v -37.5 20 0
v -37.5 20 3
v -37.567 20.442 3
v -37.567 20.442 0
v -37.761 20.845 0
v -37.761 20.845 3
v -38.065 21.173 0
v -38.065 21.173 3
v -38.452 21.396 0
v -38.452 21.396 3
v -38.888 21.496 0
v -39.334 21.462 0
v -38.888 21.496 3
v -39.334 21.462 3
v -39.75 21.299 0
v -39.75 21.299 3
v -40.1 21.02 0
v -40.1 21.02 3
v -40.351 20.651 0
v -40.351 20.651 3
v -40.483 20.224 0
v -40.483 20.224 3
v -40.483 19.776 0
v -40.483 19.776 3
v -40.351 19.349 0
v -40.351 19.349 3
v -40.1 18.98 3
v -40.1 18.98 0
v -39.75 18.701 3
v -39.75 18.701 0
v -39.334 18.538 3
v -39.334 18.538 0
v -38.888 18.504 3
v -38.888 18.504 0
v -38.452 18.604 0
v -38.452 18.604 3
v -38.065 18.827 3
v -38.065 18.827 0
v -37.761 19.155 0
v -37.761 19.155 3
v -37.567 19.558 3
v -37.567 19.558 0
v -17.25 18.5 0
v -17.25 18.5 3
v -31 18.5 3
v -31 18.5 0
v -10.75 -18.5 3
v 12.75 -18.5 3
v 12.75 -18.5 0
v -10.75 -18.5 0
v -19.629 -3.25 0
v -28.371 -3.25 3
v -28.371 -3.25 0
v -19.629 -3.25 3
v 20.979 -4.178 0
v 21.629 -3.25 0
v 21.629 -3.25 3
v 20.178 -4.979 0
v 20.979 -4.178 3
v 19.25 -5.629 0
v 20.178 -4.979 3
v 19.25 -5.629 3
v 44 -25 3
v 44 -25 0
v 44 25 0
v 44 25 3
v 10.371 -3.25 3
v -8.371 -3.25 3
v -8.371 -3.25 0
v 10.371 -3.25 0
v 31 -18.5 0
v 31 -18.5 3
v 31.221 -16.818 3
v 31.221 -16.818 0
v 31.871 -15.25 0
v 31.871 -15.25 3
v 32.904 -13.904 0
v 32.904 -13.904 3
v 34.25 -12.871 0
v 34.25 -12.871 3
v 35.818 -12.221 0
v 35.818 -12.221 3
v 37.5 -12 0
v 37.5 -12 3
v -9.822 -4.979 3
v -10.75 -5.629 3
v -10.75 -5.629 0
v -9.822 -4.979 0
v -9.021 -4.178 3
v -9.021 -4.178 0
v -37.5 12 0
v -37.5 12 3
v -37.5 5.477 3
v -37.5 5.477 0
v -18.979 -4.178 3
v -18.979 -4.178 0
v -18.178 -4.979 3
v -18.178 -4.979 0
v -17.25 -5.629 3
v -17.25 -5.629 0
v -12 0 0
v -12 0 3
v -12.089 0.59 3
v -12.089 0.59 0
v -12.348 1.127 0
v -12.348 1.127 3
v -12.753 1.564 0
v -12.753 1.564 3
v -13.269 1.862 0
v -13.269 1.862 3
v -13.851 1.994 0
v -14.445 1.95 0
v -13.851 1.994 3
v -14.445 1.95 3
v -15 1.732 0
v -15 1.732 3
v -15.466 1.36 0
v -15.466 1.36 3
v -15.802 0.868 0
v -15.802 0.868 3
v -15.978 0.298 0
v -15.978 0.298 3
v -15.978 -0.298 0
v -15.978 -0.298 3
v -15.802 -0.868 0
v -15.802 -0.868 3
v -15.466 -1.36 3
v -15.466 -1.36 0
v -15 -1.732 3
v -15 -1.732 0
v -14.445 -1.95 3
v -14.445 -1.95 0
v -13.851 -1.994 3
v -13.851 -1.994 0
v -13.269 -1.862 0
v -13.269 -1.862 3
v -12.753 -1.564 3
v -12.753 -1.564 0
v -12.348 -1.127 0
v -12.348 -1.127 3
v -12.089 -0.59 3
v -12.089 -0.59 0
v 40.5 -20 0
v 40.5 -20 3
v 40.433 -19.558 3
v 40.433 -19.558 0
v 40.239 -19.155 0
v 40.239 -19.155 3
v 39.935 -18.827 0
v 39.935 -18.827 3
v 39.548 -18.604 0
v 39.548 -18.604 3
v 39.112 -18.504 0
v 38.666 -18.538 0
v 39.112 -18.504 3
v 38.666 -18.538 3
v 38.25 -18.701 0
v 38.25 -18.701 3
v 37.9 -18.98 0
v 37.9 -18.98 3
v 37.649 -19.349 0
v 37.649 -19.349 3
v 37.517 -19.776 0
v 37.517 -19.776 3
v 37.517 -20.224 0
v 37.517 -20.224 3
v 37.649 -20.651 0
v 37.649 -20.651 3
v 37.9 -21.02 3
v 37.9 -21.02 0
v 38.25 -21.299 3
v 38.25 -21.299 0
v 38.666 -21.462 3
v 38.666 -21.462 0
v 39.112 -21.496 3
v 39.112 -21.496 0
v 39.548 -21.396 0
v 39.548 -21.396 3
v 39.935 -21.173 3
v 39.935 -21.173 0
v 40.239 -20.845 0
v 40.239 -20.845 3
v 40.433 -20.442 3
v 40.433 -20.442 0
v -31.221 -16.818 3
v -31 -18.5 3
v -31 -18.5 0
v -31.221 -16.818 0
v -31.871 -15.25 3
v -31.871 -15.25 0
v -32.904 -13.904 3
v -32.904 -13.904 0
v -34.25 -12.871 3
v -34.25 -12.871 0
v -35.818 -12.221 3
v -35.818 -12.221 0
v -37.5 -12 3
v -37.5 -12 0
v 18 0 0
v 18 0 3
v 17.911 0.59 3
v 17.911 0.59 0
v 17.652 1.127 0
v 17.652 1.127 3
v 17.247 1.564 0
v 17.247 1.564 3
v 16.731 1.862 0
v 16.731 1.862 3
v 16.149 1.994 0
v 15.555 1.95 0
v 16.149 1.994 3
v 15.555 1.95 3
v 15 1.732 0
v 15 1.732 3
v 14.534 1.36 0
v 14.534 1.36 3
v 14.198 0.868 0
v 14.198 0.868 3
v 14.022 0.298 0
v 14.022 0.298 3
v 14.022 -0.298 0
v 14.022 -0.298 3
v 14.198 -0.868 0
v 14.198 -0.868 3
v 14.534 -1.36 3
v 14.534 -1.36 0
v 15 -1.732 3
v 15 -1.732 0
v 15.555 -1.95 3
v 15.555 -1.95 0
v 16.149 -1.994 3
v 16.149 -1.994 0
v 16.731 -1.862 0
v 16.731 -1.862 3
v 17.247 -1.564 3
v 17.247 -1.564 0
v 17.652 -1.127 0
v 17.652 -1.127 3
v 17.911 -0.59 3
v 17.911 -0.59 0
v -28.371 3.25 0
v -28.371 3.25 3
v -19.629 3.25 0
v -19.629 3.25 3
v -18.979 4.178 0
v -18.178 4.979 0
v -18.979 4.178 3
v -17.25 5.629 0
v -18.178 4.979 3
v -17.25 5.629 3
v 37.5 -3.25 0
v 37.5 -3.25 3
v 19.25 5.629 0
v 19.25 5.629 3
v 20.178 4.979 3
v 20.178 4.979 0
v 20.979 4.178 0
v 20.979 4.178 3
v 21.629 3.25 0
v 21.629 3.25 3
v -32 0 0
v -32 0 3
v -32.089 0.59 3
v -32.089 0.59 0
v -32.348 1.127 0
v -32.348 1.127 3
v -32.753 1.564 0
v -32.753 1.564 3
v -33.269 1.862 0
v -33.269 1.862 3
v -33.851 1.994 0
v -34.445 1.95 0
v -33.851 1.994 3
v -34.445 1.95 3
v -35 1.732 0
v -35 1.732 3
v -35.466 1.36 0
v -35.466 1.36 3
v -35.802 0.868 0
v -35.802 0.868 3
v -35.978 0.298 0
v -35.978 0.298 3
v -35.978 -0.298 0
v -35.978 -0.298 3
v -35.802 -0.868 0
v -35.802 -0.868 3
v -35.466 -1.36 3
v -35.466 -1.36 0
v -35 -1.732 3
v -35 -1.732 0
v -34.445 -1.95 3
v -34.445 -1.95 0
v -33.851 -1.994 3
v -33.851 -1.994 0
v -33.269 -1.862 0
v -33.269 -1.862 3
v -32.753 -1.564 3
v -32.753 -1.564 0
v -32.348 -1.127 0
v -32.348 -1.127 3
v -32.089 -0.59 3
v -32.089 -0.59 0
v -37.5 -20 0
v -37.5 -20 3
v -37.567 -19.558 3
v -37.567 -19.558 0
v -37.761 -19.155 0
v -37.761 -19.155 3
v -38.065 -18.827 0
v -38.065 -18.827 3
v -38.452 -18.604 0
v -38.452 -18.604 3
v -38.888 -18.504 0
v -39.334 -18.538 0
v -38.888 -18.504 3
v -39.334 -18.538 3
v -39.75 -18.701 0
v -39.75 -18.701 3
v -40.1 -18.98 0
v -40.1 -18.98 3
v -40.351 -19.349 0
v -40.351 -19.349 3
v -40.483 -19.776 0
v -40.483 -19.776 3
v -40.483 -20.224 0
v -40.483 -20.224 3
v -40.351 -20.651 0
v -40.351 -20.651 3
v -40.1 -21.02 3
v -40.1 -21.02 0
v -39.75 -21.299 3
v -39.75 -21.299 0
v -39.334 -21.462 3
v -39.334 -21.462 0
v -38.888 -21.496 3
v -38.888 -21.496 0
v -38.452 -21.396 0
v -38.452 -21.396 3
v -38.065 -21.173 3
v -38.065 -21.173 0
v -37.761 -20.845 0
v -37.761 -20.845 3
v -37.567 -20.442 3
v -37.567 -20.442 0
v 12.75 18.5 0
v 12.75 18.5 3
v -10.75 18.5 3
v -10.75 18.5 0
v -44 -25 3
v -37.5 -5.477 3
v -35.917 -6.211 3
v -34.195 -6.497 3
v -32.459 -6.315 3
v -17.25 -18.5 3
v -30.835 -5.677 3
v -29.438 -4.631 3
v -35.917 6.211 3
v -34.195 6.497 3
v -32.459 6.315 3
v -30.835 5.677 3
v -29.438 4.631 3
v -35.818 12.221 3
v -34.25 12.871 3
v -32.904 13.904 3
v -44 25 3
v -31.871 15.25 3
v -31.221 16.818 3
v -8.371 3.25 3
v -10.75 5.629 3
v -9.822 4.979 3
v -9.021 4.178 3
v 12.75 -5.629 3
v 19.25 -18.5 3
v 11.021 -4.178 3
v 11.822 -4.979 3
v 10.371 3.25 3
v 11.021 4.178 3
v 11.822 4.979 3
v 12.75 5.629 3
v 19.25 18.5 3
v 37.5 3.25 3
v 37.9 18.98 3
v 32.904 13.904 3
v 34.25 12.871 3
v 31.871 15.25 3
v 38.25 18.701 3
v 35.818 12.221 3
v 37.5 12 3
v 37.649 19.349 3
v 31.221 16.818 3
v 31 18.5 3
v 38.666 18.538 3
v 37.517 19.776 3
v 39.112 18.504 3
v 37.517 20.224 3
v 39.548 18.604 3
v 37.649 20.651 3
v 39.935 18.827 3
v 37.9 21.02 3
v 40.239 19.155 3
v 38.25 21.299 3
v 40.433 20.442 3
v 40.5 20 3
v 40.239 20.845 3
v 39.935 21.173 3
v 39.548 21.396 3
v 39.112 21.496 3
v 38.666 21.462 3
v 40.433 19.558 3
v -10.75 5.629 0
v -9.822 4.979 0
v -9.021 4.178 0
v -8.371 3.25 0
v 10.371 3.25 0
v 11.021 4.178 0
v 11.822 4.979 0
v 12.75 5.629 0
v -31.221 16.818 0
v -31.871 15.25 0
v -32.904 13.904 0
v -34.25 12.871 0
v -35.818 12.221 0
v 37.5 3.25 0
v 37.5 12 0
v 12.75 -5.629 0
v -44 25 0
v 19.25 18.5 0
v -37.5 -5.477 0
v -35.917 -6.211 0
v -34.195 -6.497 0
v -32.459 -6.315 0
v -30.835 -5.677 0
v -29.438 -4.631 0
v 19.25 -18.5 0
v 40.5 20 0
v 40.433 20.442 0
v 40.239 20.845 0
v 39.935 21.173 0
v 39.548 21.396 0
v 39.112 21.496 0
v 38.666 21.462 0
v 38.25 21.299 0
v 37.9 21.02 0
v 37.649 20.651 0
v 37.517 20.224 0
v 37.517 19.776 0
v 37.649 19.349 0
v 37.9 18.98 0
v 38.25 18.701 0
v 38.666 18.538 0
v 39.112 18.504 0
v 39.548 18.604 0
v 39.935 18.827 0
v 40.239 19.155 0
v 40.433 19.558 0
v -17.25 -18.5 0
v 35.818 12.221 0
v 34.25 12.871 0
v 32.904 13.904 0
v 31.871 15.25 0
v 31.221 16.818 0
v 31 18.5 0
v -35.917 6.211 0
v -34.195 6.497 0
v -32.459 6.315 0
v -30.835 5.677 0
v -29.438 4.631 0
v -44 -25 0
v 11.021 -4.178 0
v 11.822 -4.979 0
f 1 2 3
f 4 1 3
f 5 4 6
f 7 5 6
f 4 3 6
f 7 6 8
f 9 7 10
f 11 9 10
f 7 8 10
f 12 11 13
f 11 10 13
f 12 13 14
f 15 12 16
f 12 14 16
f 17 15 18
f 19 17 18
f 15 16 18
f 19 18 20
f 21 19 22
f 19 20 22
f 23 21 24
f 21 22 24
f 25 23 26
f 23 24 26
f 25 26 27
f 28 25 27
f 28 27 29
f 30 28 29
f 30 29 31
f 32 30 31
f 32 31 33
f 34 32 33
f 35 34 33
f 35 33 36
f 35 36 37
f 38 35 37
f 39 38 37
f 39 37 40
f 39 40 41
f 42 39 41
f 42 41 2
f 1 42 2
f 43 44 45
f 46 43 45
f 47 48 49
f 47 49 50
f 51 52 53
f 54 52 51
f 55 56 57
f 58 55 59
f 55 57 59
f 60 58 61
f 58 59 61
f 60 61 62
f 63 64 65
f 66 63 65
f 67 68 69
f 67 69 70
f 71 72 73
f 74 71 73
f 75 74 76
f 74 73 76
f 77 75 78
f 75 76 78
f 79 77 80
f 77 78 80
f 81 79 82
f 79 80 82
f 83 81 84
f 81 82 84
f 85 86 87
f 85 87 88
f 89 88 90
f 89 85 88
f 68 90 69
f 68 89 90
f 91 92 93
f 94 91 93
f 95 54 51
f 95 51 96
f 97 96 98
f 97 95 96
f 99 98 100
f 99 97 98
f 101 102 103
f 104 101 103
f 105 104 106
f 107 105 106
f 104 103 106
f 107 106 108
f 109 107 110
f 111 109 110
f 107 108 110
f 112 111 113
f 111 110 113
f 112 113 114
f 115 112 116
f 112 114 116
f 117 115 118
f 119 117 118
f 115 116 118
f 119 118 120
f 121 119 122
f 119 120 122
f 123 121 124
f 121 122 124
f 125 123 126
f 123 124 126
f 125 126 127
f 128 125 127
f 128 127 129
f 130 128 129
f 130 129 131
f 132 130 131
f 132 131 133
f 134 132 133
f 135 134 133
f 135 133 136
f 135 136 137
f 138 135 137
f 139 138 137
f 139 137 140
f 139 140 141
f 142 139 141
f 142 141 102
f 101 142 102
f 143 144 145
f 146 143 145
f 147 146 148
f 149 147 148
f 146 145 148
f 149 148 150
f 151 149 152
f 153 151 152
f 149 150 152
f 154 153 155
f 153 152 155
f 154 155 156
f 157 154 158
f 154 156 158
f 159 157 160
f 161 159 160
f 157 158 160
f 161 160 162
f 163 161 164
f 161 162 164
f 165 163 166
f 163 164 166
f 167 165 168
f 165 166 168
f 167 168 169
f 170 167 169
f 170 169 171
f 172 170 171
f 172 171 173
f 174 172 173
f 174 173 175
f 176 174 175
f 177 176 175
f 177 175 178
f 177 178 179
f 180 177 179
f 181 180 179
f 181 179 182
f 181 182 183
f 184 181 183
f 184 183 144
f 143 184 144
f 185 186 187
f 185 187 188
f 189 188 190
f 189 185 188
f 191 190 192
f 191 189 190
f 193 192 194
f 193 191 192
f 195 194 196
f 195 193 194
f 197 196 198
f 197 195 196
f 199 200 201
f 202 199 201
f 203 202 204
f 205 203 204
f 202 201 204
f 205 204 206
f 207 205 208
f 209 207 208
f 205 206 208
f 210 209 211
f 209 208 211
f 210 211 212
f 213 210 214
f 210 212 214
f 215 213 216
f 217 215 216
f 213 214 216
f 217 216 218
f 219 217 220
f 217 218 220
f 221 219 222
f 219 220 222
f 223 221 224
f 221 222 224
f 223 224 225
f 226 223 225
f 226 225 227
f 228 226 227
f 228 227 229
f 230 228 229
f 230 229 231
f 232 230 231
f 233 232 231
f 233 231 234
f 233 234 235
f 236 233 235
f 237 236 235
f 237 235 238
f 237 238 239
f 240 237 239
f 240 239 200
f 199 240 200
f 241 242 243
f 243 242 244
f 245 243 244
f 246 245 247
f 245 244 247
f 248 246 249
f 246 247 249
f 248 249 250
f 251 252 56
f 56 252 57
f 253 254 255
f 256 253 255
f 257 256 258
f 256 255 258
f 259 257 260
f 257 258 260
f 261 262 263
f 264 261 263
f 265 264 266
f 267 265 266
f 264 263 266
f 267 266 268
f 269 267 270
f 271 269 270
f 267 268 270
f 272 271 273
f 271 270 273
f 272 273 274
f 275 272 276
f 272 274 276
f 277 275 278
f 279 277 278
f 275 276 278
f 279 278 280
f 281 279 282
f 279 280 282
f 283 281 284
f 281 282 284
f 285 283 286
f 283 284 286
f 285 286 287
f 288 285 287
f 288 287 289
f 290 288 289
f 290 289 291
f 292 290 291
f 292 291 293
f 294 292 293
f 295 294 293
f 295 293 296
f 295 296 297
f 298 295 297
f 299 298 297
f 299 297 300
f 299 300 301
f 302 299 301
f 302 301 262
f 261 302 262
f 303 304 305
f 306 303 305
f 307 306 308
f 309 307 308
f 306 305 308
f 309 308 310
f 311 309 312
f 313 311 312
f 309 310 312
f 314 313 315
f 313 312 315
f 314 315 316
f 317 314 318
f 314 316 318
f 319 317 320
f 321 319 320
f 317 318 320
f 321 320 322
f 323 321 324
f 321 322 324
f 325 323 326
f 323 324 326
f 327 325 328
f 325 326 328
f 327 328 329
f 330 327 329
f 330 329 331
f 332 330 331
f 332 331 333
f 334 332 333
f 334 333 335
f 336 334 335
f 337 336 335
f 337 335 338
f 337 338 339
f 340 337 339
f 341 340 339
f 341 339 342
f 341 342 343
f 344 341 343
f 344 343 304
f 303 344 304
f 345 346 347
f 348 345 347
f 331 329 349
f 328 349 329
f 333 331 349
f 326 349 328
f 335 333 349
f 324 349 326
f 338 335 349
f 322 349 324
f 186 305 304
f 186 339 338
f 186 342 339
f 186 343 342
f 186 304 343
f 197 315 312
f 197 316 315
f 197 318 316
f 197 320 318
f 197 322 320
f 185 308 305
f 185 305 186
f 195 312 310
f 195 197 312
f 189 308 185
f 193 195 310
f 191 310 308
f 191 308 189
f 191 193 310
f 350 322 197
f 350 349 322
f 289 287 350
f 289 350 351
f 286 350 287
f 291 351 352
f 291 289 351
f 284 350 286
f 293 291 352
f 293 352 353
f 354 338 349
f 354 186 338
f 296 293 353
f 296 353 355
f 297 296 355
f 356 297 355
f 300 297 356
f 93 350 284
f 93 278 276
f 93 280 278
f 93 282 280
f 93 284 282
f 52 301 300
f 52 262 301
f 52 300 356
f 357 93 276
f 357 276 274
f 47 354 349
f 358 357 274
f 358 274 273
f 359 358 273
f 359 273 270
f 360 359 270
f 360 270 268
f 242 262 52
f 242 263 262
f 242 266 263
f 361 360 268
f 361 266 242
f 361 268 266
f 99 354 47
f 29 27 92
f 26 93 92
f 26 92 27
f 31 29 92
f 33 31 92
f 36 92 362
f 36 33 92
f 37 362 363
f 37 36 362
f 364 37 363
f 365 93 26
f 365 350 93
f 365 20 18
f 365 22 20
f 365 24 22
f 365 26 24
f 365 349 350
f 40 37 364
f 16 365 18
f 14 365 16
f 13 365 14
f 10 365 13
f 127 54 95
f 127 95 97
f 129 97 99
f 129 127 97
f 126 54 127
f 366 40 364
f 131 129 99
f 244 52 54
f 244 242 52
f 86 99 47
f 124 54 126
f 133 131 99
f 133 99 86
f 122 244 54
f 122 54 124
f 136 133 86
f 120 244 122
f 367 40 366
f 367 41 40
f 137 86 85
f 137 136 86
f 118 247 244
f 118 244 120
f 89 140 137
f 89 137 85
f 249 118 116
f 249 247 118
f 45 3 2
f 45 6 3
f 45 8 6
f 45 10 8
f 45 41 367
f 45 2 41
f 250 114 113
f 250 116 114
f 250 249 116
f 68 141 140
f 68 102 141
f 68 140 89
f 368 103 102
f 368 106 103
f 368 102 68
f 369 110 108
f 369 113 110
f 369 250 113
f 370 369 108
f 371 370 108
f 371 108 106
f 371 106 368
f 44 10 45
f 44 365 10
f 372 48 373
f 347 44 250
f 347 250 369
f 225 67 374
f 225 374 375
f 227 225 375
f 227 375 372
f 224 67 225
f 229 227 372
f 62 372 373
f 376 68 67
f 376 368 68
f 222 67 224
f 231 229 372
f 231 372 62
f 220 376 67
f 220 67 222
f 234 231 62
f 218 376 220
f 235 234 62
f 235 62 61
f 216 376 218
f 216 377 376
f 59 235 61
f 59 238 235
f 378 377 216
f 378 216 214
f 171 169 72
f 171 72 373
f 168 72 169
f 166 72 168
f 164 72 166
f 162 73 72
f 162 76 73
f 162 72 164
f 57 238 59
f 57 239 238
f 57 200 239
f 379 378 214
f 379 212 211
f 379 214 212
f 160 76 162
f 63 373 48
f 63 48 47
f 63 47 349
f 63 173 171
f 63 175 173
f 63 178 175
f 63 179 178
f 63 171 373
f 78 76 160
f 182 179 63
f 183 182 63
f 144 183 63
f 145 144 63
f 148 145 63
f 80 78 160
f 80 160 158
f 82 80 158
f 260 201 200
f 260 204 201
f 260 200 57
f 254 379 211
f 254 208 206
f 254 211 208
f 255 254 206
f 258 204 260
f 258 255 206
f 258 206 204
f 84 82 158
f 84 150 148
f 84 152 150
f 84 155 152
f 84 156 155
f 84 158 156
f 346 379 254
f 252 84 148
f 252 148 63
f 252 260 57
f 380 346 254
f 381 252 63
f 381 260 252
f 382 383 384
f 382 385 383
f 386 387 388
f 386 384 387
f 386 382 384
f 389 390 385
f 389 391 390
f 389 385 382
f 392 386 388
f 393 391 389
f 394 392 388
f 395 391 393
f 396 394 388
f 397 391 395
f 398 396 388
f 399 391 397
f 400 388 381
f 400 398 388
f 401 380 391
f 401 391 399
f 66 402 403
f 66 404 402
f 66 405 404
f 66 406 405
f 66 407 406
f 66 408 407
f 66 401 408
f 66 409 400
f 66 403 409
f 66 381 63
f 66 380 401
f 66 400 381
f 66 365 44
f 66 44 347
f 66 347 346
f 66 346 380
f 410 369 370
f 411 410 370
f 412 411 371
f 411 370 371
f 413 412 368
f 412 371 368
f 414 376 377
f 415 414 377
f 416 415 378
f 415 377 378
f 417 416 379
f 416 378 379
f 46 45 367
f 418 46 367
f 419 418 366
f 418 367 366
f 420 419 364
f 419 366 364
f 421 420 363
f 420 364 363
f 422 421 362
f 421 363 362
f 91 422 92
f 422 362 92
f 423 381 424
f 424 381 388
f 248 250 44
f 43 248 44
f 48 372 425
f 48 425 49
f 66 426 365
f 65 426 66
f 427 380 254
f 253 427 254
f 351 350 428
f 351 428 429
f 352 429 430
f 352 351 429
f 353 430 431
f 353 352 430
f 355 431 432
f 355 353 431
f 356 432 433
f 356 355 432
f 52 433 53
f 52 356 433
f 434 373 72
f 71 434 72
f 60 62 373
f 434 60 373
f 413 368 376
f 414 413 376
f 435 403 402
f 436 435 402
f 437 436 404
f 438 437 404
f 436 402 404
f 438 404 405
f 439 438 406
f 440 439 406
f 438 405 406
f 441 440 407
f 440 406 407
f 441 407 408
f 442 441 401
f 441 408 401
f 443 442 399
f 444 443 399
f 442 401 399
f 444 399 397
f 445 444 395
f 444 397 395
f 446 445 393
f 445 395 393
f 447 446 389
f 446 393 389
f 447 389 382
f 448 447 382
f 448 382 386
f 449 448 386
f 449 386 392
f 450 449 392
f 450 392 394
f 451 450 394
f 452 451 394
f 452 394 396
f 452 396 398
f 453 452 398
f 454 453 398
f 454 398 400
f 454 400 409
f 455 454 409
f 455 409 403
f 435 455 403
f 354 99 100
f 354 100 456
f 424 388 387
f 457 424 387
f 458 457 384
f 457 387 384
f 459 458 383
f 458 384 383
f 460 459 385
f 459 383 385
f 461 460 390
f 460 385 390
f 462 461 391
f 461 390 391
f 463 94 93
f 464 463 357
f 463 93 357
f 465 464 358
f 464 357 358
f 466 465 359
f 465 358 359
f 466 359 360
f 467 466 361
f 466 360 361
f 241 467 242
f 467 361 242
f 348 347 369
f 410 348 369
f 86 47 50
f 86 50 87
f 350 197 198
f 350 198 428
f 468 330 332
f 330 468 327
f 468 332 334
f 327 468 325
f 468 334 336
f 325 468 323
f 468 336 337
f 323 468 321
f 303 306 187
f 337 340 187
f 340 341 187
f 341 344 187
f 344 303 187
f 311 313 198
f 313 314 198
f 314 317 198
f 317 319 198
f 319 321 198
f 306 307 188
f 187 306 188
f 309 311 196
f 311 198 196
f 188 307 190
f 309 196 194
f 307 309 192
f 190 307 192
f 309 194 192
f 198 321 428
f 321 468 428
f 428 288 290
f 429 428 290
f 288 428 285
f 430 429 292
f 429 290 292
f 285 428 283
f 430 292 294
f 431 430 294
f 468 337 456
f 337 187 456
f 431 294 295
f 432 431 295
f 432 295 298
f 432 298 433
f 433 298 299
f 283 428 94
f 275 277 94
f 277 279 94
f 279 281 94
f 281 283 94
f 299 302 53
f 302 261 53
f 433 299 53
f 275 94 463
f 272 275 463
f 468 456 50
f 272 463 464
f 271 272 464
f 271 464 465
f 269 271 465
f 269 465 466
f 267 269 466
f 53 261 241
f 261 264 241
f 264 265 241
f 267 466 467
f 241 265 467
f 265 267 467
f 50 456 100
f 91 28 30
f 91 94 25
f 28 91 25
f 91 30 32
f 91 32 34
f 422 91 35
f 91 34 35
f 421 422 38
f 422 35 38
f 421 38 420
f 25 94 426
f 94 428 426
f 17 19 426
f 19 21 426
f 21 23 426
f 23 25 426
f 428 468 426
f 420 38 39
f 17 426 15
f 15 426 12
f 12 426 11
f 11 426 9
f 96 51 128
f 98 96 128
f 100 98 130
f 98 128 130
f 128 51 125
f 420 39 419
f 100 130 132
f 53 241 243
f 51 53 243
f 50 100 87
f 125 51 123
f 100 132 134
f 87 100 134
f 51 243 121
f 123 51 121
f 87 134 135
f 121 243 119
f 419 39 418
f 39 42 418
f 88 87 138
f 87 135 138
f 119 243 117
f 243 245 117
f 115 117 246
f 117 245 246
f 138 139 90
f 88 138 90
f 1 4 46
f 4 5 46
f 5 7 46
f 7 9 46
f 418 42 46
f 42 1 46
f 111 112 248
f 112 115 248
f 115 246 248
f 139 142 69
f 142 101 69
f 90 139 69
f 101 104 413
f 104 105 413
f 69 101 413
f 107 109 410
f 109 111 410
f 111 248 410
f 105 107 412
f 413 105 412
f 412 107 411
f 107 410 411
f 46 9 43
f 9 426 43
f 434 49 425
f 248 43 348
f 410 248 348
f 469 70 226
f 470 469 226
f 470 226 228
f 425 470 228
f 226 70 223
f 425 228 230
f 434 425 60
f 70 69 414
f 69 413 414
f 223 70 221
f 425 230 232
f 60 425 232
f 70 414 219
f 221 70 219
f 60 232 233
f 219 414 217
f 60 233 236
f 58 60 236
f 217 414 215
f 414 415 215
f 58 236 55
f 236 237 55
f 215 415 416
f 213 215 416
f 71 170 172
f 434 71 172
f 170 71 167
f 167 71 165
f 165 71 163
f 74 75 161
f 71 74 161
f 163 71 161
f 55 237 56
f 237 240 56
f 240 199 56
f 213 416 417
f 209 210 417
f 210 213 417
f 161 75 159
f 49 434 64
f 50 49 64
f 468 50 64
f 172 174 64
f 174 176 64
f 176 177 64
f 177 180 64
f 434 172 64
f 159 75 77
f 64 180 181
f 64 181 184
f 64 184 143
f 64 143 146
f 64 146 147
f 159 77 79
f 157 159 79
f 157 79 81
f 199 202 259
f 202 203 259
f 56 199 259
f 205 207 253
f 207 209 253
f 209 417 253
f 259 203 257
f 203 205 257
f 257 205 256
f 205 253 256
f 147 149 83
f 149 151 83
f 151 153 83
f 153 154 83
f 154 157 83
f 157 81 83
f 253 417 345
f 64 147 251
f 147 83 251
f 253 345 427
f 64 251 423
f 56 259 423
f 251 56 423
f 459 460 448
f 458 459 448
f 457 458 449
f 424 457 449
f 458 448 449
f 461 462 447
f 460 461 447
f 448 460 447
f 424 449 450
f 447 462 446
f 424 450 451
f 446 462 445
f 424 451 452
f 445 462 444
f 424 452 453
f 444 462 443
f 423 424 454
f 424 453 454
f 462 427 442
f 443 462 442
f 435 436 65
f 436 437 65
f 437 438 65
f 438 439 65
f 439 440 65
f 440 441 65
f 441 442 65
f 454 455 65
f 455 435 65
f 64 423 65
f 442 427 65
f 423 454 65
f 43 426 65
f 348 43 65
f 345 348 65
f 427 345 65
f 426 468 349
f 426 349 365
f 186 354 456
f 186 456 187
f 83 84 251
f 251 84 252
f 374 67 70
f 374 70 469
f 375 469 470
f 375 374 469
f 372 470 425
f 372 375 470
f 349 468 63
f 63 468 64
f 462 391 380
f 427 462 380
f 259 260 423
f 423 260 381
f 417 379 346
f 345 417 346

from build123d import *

# Parameters (mm, degrees)
SKETCH1_W            = 88
SKETCH1_H            = 50
BOSS_EXTRUDE1_DEPTH  = 3
SKETCH2_R            = 2
CUT_EXTRUDE1_DEPTH   = 51.695167423
SKETCH3_R            = 1.5
CUT_EXTRUDE2_DEPTH   = 51.695167423
LPATTERN1_COUNT      = 2
LPATTERN1_PITCH      = 78
LPATTERN1_COUNT_DIR2 = 2
LPATTERN1_PITCH_DIR2 = 40
CUT_EXTRUDE3_DEPTH   = 51.695167423


with BuildPart() as part:
    # Sketch1 → Boss-Extrude1 (new body)
    with BuildSketch(Plane.XY):
        Rectangle(SKETCH1_W, SKETCH1_H)
    extrude(amount=BOSS_EXTRUDE1_DEPTH)

    # Sketch2 → Cut-Extrude1 (cut, through all)
    with BuildSketch(Plane.XY.offset(3)):
        with Locations((-34, 0)):
            Circle(SKETCH2_R)
        with Locations((-14, 0)):
            Circle(SKETCH2_R)
        with Locations((16, 0)):
            Circle(SKETCH2_R)
    extrude(amount=-CUT_EXTRUDE1_DEPTH, mode=Mode.SUBTRACT)

    # Sketch3 → Cut-Extrude2 (cut, through all)
    with BuildSketch(Plane.XY.offset(3)):
        with Locations((-39, 20)):
            Circle(SKETCH3_R)
    cut_extrude2 = extrude(amount=-CUT_EXTRUDE2_DEPTH, mode=Mode.SUBTRACT)

    # LPattern1: Cut-Extrude2 2 × 2
    with Locations(*[(i * LPATTERN1_PITCH, -j * LPATTERN1_PITCH_DIR2, 0) for i in range(LPATTERN1_COUNT) for j in range(LPATTERN1_COUNT_DIR2) if (i, j) != (0, 0)]):
        add(cut_extrude2, mode=Mode.SUBTRACT)

    # Sketch4 → Cut-Extrude3 (cut, through all)
    with BuildSketch(Plane.XY.offset(3)):
        with BuildLine():
            Line((37.5, 3.25), (37.5, 12))
            ThreePointArc((37.5, 12), (32.903805922, 13.903805922), (31, 18.5))
            Line((31, 18.5), (19.25, 18.5))
            Line((19.25, 18.5), (19.25, 5.629165125))
            ThreePointArc((19.25, 5.629165125), (20.596194078, 4.596194078), (21.629165125, 3.25))
            Line((21.629165125, 3.25), (37.5, 3.25))
        make_face()
        with BuildLine():
            Line((-28.370834875, 3.25), (-19.629165125, 3.25))
            ThreePointArc((-19.629165125, 3.25), (-18.596194078, 4.596194078), (-17.25, 5.629165125))
            Line((-17.25, 5.629165125), (-17.25, 18.5))
            Line((-17.25, 18.5), (-31, 18.5))
            ThreePointArc((-31, 18.5), (-32.903805922, 13.903805922), (-37.5, 12))
            Line((-37.5, 12), (-37.5, 5.477225575))
            ThreePointArc((-37.5, 5.477225575), (-32.459393148, 6.314786657), (-28.370834875, 3.25))
        make_face()
        with BuildLine():
            Line((-8.370834875, 3.25), (10.370834875, 3.25))
            ThreePointArc((10.370834875, 3.25), (11.403805922, 4.596194078), (12.75, 5.629165125))
            Line((12.75, 5.629165125), (12.75, 18.5))
            Line((12.75, 18.5), (-10.75, 18.5))
            Line((-10.75, 18.5), (-10.75, 5.629165125))
            ThreePointArc((-10.75, 5.629165125), (-9.403805922, 4.596194078), (-8.370834875, 3.25))
        make_face()
        with BuildLine():
            Line((-28.370834875, -3.25), (-19.629165125, -3.25))
            ThreePointArc((-19.629165125, -3.25), (-18.596194078, -4.596194078), (-17.25, -5.629165125))
            Line((-17.25, -5.629165125), (-17.25, -18.5))
            Line((-17.25, -18.5), (-31, -18.5))
            ThreePointArc((-31, -18.5), (-32.903805922, -13.903805922), (-37.5, -12))
            Line((-37.5, -12), (-37.5, -5.477225575))
            ThreePointArc((-37.5, -5.477225575), (-32.459393148, -6.314786657), (-28.370834875, -3.25))
        make_face()
        with BuildLine():
            Line((37.5, -12), (37.5, -3.25))
            Line((37.5, -3.25), (21.629165125, -3.25))
            ThreePointArc((21.629165125, -3.25), (20.596194078, -4.596194078), (19.25, -5.629165125))
            Line((19.25, -5.629165125), (19.25, -18.5))
            Line((19.25, -18.5), (31, -18.5))
            ThreePointArc((31, -18.5), (32.903805922, -13.903805922), (37.5, -12))
        make_face()
        with BuildLine():
            Line((-8.370834875, -3.25), (10.370834875, -3.25))
            ThreePointArc((10.370834875, -3.25), (11.403805922, -4.596194078), (12.75, -5.629165125))
            Line((12.75, -5.629165125), (12.75, -18.5))
            Line((12.75, -18.5), (-10.75, -18.5))
            Line((-10.75, -18.5), (-10.75, -5.629165125))
            ThreePointArc((-10.75, -5.629165125), (-9.403805922, -4.596194078), (-8.370834875, -3.25))
        make_face()
    extrude(amount=-CUT_EXTRUDE3_DEPTH, mode=Mode.SUBTRACT)


solid = part.part
